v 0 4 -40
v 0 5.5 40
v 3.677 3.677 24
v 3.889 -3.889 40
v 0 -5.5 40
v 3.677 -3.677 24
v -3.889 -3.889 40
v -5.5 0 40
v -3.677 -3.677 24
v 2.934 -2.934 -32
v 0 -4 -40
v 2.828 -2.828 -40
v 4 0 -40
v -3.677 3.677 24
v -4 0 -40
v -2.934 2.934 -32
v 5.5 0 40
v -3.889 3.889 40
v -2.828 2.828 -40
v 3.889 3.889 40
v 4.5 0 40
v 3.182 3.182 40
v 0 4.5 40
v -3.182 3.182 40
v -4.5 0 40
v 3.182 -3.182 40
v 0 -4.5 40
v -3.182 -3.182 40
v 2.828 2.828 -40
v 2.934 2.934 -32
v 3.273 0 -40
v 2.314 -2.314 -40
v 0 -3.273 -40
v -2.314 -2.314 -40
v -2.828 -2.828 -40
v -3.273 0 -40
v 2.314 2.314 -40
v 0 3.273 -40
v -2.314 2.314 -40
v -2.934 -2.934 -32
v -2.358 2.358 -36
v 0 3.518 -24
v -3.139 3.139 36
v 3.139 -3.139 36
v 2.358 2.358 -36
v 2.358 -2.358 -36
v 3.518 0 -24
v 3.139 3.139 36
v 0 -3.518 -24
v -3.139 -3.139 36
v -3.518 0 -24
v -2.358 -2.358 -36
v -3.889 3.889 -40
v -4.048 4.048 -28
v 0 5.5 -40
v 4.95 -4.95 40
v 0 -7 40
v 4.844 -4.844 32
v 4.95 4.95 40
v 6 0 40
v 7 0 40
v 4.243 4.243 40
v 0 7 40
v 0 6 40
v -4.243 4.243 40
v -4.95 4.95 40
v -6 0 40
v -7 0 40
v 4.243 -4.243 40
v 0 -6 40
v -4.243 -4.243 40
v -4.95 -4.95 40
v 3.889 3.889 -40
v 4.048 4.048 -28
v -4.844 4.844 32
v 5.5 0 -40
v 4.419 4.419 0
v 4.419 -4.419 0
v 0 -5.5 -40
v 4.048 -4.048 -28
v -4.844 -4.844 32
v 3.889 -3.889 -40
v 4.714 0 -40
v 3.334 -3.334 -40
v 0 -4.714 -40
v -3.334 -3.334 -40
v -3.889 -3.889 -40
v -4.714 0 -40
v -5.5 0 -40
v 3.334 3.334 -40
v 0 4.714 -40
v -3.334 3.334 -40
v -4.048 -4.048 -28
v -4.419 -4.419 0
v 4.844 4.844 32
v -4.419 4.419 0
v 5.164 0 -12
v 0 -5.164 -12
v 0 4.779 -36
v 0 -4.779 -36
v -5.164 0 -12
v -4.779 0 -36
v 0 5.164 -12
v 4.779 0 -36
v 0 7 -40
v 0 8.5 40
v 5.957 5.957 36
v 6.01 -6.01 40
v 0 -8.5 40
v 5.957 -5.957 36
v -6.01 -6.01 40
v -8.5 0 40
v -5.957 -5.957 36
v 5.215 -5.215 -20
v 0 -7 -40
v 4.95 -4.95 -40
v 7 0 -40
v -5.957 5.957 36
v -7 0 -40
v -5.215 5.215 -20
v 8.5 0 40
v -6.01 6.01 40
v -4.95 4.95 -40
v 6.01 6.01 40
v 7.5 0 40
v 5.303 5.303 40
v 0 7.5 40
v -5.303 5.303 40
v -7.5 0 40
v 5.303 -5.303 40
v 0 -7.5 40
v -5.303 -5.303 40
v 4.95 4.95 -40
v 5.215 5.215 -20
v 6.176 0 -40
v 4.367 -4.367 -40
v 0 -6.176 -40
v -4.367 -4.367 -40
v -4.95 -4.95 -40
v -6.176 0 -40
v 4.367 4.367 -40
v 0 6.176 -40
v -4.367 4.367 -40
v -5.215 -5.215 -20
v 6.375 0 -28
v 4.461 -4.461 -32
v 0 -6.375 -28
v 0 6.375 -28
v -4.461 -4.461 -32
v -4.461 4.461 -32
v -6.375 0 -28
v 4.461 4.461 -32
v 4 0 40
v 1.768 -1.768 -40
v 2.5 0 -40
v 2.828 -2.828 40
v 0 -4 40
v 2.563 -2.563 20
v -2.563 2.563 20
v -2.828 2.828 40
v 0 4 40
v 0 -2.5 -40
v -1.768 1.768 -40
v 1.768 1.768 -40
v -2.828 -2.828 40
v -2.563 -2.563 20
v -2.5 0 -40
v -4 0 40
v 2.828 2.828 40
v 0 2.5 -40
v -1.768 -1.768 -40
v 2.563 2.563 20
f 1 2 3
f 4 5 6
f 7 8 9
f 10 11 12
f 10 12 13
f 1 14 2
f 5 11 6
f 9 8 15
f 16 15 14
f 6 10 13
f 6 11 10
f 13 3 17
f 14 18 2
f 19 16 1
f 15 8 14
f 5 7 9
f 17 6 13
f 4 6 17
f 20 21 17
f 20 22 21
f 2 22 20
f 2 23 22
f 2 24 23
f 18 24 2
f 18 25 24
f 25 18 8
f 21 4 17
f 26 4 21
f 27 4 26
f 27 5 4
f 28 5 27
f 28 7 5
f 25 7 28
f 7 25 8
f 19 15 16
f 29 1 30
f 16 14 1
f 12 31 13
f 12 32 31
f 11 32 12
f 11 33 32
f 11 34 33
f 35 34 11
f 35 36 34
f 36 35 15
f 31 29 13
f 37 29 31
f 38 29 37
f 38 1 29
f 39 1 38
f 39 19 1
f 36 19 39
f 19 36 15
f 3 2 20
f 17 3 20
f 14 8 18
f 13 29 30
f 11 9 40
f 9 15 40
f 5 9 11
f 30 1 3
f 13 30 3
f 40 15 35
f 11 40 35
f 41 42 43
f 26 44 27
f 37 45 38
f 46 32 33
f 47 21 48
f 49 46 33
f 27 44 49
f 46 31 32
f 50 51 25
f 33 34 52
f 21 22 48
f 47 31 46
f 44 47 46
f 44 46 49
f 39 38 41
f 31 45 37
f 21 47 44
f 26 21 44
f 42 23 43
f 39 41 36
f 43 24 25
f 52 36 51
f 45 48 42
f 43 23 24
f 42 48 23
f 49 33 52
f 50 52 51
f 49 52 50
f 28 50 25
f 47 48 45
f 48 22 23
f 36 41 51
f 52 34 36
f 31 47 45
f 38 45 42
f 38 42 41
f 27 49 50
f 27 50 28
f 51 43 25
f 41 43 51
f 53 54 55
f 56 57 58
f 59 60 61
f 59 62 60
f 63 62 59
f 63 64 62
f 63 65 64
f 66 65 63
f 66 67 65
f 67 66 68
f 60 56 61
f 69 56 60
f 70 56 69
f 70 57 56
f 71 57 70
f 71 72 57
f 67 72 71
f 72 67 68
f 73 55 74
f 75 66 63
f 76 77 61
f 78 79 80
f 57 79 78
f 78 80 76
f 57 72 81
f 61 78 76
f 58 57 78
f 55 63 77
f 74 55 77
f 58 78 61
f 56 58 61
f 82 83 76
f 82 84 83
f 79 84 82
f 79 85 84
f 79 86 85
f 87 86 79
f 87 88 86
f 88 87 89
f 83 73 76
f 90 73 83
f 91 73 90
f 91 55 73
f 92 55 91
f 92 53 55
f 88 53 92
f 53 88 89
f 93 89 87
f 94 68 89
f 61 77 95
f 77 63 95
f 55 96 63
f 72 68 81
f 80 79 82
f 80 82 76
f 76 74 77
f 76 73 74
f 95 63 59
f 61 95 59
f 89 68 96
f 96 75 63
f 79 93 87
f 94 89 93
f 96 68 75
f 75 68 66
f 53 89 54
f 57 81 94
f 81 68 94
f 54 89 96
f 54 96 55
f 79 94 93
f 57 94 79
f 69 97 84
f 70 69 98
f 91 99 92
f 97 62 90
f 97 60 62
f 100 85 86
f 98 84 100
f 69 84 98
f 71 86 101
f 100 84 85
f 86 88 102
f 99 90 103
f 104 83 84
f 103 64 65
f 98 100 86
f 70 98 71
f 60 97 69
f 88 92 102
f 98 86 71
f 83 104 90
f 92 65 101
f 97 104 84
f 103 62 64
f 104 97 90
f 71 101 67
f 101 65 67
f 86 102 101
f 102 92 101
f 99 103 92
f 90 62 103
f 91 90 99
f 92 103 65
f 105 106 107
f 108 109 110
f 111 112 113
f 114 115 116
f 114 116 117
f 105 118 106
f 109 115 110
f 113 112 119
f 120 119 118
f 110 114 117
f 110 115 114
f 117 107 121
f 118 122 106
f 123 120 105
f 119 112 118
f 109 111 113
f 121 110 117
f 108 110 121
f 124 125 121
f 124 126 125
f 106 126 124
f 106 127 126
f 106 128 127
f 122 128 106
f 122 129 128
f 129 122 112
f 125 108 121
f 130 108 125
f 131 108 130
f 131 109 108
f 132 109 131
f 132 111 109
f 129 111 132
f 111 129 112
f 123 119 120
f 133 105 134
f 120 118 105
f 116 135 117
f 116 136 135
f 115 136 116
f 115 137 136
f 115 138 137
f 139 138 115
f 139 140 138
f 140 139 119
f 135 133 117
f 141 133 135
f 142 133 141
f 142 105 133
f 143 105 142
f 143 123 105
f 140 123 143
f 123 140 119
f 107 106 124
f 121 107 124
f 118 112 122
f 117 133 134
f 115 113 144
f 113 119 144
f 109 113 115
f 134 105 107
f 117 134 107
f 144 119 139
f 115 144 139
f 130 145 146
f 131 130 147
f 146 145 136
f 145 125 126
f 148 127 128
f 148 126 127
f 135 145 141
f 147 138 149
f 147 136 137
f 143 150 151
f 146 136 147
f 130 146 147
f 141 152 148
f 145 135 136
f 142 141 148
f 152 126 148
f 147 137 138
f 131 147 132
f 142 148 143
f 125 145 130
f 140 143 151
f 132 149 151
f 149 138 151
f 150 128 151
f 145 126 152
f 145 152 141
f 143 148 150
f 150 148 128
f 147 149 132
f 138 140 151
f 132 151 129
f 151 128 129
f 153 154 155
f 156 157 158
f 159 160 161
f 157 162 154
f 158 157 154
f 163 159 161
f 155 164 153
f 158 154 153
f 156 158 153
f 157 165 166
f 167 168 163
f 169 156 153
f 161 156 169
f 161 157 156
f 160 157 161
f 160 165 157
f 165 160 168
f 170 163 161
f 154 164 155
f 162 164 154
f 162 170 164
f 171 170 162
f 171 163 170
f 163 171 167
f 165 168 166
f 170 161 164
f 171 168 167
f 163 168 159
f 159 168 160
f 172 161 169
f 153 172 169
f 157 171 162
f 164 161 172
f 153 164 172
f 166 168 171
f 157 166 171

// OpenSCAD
// Min_Diameter = 4; //[1:0.1:100]


Min_Outer_Diameter = 8; //[1:0.1:10]
Min_Inner_Diameter = 3; //[0.5:0.1:20]
Height = 80; //[1:1:300]
Wall_Thickness = 1; //[1:0.1:10]
Twist_Factor = 0; //[0:1:360]
Scale_Factor = 0.8; //[0.1:0.05:1]
Num_Edges = 8; //[3:1:200]
Num_Sections = 4; //[1:1:10]
Section_Spacing = 3; //[2:0.5:6]

/* [Common Handle Params] */
Handle_Type = "none"; //["none":"None", "poly":"Rotated Polygon", "stl":"STL File"]
Handle_Max_Diameter = 20; //[15:1:60]
Handle_Height_Padding = 20; //[0:1:60]
Flip_Handle = false;

/* [STL Handle] */
Handle_Stl = "none"; //["none":"None", "/Users/john.andersen/Downloads/wandHiltWooden1_fixed.stl":"Wooden 1", "/Users/john.andersen/Downloads/ElegantJewelledHandle.stl":"Jewelled"]


/* [Rotated Polygon Handle] */
Pommel_Extend_X = 3; //[0:0.1:30]
Pommel_Outer_Height = 10; //[0:1:50]
Pommel_Total_Height = 20; //[0:1:50]

Guard_Extend_X = 8; //[0:0.1:30]
Guard_Outer_Height = 8; //[0:1:50]
Guard_Total_Height = 20; //[0:1:50]

/* [Drafting Options] */
Wand_Cutout = false;
Transparent_Shell = true; // Set to true to make the shell transparent for better visualization of internal structure during design

/* [Hidden] */
Base_Padding = 2;

Handle_Hollow_Diameter = sectionOuterBaseDiameter(Num_Sections) + 2*Wall_Thickness;
Extended_Wand = false;


for(i=[0:Num_Sections-1]){
    echo(str("Section ", i, ": Outer Base Diameter (", sectionOuterBaseDiameter(i), ") -> Section ", i+1, " Inner End Diameter = (", sectionInnerEndDiameter(i+1), ") => Difference of ", sectionOuterBaseDiameter(i) - sectionInnerEndDiameter(i+1)));
}


difference(){
    rotate([180, 0, 0]){
        wand();
    }
    if(Wand_Cutout){
        translate([sectionOuterBaseDiameter(Num_Sections)/2, 0, 0]){
            cube([sectionOuterBaseDiameter(Num_Sections), sectionOuterBaseDiameter(Num_Sections)*2, Height*(Num_Sections*2)], center=true);
        }
    }
}


module wand(){
    c = ["red", "blue", "cyan", "magenta", "orange", "purple", "pink", "brown", "lime", "teal", "navy", "maroon", "olive", "gray"];
    if(Handle_Type != "none"){
        handle();
    }
    
    for(i = [0:Num_Sections-1]){
        height = Height;
        extension = Extended_Wand ? (i+1)*(height*3/4) : 0;
        translate([0, 0, Extended_Wand ? extension : 0]){
            section(index=i, solid=(i==0), color=c[i]); 
        }
    }
}

// function sectionBaseDiameterV2(index) = index == 0 ? sectionEndDiameter(index) / Scale_Factor * 1.1 : sectionEndDiameter(index) / Scale_Factor; 
// function sectionEndDiameterV2(index) =  Min_Diameter + Section_Spacing*index*Wall_Thickness;

// function sectionBaseDiameter(index, outer=true) = 
//     index == 0 ? 
//         outer ? 
//             sectionEndDiameter(index) / Scale_Factor * 1.0 
//         : 
//             (sectionEndDiameter(index) - 2*Wall_Thickness) / Scale_Factor
//     : outer ?
//         sectionEndDiameter(index+1)
//     :
//         sectionEndDiameter(index+1) - 2*Wall_Thickness;

// function sectionBaseDiameter(index, outer=true) = 
//     index == 0 ? 
//         outer ? 
//             sectionEndDiameter(index+1)
//         : 
//             (sectionEndDiameter(index) - 2*Wall_Thickness) / Scale_Factor
//     : outer ?
//         sectionEndDiameter(index+1)
//     :
//         sectionEndDiameter(index+1) - 2*Wall_Thickness;


// function sectionEndDiameter(index, outer=true) =  
//     outer ? 
//         Min_Diameter + index*Section_Spacing*Wall_Thickness
//     :
//         Min_Diameter + index*Section_Spacing*Wall_Thickness - 2*Wall_Thickness;


function sectionOuterBaseDiameter(index) = Min_Outer_Diameter + index*Section_Spacing*Wall_Thickness;
function sectionInnerBaseDiameter(index) = sectionOuterBaseDiameter(index) - 2*Wall_Thickness;
function sectionInnerEndDiameter(index) = Min_Inner_Diameter + index*Section_Spacing*Wall_Thickness;
function sectionOuterEndDiameter(index) = sectionInnerEndDiameter(index) + 2*Wall_Thickness;


module section(index=0, solid=false, color=0){
    height = Height;
    calculatedScaleFactor = sectionOuterEndDiameter(index) / sectionOuterBaseDiameter(index); 
    echo(str("Section ", index, ": Base Diameter = ", sectionOuterBaseDiameter(index), ", End Diameter = ", sectionOuterEndDiameter(index), ", Scale Factor = ", calculatedScaleFactor));
    if(index > 0){
        assert(sectionOuterBaseDiameter(index) >= sectionInnerEndDiameter(index-1), str("Error: Section ", index, " outer base diameter (", sectionOuterBaseDiameter(index), ") must be less than or equal to previous section's base diameter (", sectionInnerEndDiameter(index-1), "). Adjust the parameters to ensure proper fitting."));
    }
    transparency = Transparent_Shell && index == Num_Sections-1 ? 0.2 : 1;
    color(color, transparency){
        difference(){
            linear_extrude(height = height, v = [0, 0, 1], center = true, convexity = 10, twist = Twist_Factor, slices = 20, scale = calculatedScaleFactor, $fn = 16) {
                    circle(d=sectionOuterBaseDiameter(index), $fn=Num_Edges);  
            }
            // if(!solid){
            //     prct = (sectionOuterBaseDiameter(index)-2*Wall_Thickness)/sectionOuterBaseDiameter(index);
            //     echo(str("Section ", index, ": Outer Base Diameter = ", sectionOuterBaseDiameter(index), ", Inner Base Diameter = ", sectionOuterBaseDiameter(index)-2*Wall_Thickness, ", Percentage = ", prct));
            //     // resize([sectionOuterBaseDiameter(index)-2*Wall_Thickness, sectionOuterBaseDiameter(index)-2*Wall_Thickness, height]){
            //     linear_extrude(height = height, v = [0, 0, 1], center = true, convexity = 10, twist = Twist_Factor, slices = 20, scale = calculatedScaleFactor, $fn = 16) {
            //         scale([(sectionOuterBaseDiameter(index)-2*Wall_Thickness)/sectionOuterBaseDiameter(index), (sectionOuterBaseDiameter(index)-2*Wall_Thickness)/sectionOuterBaseDiameter(index),1]){
            //             circle(d=sectionInnerBaseDiameter(index), $fn=Num_Edges);  
            //         }
            //     }
            // }
            if(!solid){
                linear_extrude(height = height, v = [0, 0, 1], center = true, convexity = 10, twist = Twist_Factor, slices = 20, scale = calculatedScaleFactor, $fn = 16) {
                    circle(d=sectionInnerBaseDiameter(index), $fn=Num_Edges);  
                }
            }
        }
    }
}




module handleStl(stl){

    translate([0, 0, -Wall_Thickness-Handle_Height_Padding/2]){
        resize([Handle_Max_Diameter, Handle_Max_Diameter, Height+2*Wall_Thickness+Handle_Height_Padding]){
            import(stl, center=true);   
        }
    }

}



module handleRotateExtrude(){
    pommelExtend = Pommel_Extend_X;
    pommelBaseRadius = Handle_Max_Diameter/2 + 2*Wall_Thickness;
    pommelOuterRadius = Handle_Max_Diameter/2 + pommelExtend;
    pommelOuterHeight = Pommel_Outer_Height;
    pommelTotalHeight = Pommel_Total_Height;

    guardExtend = Guard_Extend_X;
    guardBaseRadius = pommelBaseRadius;
    guardOuterRadius = Handle_Max_Diameter/2 + guardExtend;
    guardOuterHeight = Guard_Outer_Height;
    guardTotalHeight = Guard_Total_Height;
    
    gripHeight = Height-pommelTotalHeight-guardTotalHeight+Base_Padding+Wall_Thickness+Handle_Height_Padding;
    gripRadius = pommelBaseRadius;

    totalHeight = pommelTotalHeight + gripHeight + guardTotalHeight;

    difference(){
        rotate([0, 0, 0]) {
            translate([0, 0, -Height/2+(Height-totalHeight)]){
                rotate_extrude($fn=200) polygon( points=[
                    [0,0],
                    [pommelBaseRadius,0],
                    [pommelOuterRadius, (pommelTotalHeight/2-pommelOuterHeight/2)],
                    [pommelOuterRadius, (pommelTotalHeight/2+pommelOuterHeight/2)],
                    [pommelBaseRadius, pommelTotalHeight],
                    [gripRadius, pommelTotalHeight+gripHeight], 
                    [guardOuterRadius, pommelTotalHeight+gripHeight+guardTotalHeight/2-guardOuterHeight/2],
                    [guardOuterRadius, pommelTotalHeight+gripHeight+guardTotalHeight/2+guardOuterHeight/2],
                    [gripRadius, pommelTotalHeight+gripHeight+guardTotalHeight],
                    [0, pommelTotalHeight+gripHeight+guardTotalHeight]
                ]);
            }
        } 
        // translate([0, 0, 0]){
        //     // component(baseDiameter=baseDiameter(0), endDiameter=endDiameter(0), height=Height, solidBase=(true), roundedEnd=(true), solid=true);
        //     cylinder(d1=Handle_Hollow_Diameter, d2=Handle_Hollow_Diameter*Scale_Factor, h=Height+2*Base_Padding, center=true, $fn=16);
        // }
        
    }
}

module handle(){
    difference(){
        if(Handle_Type == "stl"){
            rotateX = Flip_Handle ? 180 : 0;
            rotate([rotateX, 0, 0]) {
                handleStl(stl=Handle_Stl);
            }
        } else {
            handleRotateExtrude();
        }
        // component(baseDiameter=sectionBaseDiameter(Num_Sections), endDiameter=sectionEndDiameter(Num_Sections), height=Height+2*Base_Padding, solidBase=true, roundedEnd=true, solid=true);
        section(index=Num_Sections, solid=true, color="white");
        translate([0, 0, -(Height/2 + Base_Padding/2)]){
            cylinder(d=sectionBaseDiameter(Num_Sections), h=Base_Padding, center=true, $fn=92);
        }
    }
    
    

}
